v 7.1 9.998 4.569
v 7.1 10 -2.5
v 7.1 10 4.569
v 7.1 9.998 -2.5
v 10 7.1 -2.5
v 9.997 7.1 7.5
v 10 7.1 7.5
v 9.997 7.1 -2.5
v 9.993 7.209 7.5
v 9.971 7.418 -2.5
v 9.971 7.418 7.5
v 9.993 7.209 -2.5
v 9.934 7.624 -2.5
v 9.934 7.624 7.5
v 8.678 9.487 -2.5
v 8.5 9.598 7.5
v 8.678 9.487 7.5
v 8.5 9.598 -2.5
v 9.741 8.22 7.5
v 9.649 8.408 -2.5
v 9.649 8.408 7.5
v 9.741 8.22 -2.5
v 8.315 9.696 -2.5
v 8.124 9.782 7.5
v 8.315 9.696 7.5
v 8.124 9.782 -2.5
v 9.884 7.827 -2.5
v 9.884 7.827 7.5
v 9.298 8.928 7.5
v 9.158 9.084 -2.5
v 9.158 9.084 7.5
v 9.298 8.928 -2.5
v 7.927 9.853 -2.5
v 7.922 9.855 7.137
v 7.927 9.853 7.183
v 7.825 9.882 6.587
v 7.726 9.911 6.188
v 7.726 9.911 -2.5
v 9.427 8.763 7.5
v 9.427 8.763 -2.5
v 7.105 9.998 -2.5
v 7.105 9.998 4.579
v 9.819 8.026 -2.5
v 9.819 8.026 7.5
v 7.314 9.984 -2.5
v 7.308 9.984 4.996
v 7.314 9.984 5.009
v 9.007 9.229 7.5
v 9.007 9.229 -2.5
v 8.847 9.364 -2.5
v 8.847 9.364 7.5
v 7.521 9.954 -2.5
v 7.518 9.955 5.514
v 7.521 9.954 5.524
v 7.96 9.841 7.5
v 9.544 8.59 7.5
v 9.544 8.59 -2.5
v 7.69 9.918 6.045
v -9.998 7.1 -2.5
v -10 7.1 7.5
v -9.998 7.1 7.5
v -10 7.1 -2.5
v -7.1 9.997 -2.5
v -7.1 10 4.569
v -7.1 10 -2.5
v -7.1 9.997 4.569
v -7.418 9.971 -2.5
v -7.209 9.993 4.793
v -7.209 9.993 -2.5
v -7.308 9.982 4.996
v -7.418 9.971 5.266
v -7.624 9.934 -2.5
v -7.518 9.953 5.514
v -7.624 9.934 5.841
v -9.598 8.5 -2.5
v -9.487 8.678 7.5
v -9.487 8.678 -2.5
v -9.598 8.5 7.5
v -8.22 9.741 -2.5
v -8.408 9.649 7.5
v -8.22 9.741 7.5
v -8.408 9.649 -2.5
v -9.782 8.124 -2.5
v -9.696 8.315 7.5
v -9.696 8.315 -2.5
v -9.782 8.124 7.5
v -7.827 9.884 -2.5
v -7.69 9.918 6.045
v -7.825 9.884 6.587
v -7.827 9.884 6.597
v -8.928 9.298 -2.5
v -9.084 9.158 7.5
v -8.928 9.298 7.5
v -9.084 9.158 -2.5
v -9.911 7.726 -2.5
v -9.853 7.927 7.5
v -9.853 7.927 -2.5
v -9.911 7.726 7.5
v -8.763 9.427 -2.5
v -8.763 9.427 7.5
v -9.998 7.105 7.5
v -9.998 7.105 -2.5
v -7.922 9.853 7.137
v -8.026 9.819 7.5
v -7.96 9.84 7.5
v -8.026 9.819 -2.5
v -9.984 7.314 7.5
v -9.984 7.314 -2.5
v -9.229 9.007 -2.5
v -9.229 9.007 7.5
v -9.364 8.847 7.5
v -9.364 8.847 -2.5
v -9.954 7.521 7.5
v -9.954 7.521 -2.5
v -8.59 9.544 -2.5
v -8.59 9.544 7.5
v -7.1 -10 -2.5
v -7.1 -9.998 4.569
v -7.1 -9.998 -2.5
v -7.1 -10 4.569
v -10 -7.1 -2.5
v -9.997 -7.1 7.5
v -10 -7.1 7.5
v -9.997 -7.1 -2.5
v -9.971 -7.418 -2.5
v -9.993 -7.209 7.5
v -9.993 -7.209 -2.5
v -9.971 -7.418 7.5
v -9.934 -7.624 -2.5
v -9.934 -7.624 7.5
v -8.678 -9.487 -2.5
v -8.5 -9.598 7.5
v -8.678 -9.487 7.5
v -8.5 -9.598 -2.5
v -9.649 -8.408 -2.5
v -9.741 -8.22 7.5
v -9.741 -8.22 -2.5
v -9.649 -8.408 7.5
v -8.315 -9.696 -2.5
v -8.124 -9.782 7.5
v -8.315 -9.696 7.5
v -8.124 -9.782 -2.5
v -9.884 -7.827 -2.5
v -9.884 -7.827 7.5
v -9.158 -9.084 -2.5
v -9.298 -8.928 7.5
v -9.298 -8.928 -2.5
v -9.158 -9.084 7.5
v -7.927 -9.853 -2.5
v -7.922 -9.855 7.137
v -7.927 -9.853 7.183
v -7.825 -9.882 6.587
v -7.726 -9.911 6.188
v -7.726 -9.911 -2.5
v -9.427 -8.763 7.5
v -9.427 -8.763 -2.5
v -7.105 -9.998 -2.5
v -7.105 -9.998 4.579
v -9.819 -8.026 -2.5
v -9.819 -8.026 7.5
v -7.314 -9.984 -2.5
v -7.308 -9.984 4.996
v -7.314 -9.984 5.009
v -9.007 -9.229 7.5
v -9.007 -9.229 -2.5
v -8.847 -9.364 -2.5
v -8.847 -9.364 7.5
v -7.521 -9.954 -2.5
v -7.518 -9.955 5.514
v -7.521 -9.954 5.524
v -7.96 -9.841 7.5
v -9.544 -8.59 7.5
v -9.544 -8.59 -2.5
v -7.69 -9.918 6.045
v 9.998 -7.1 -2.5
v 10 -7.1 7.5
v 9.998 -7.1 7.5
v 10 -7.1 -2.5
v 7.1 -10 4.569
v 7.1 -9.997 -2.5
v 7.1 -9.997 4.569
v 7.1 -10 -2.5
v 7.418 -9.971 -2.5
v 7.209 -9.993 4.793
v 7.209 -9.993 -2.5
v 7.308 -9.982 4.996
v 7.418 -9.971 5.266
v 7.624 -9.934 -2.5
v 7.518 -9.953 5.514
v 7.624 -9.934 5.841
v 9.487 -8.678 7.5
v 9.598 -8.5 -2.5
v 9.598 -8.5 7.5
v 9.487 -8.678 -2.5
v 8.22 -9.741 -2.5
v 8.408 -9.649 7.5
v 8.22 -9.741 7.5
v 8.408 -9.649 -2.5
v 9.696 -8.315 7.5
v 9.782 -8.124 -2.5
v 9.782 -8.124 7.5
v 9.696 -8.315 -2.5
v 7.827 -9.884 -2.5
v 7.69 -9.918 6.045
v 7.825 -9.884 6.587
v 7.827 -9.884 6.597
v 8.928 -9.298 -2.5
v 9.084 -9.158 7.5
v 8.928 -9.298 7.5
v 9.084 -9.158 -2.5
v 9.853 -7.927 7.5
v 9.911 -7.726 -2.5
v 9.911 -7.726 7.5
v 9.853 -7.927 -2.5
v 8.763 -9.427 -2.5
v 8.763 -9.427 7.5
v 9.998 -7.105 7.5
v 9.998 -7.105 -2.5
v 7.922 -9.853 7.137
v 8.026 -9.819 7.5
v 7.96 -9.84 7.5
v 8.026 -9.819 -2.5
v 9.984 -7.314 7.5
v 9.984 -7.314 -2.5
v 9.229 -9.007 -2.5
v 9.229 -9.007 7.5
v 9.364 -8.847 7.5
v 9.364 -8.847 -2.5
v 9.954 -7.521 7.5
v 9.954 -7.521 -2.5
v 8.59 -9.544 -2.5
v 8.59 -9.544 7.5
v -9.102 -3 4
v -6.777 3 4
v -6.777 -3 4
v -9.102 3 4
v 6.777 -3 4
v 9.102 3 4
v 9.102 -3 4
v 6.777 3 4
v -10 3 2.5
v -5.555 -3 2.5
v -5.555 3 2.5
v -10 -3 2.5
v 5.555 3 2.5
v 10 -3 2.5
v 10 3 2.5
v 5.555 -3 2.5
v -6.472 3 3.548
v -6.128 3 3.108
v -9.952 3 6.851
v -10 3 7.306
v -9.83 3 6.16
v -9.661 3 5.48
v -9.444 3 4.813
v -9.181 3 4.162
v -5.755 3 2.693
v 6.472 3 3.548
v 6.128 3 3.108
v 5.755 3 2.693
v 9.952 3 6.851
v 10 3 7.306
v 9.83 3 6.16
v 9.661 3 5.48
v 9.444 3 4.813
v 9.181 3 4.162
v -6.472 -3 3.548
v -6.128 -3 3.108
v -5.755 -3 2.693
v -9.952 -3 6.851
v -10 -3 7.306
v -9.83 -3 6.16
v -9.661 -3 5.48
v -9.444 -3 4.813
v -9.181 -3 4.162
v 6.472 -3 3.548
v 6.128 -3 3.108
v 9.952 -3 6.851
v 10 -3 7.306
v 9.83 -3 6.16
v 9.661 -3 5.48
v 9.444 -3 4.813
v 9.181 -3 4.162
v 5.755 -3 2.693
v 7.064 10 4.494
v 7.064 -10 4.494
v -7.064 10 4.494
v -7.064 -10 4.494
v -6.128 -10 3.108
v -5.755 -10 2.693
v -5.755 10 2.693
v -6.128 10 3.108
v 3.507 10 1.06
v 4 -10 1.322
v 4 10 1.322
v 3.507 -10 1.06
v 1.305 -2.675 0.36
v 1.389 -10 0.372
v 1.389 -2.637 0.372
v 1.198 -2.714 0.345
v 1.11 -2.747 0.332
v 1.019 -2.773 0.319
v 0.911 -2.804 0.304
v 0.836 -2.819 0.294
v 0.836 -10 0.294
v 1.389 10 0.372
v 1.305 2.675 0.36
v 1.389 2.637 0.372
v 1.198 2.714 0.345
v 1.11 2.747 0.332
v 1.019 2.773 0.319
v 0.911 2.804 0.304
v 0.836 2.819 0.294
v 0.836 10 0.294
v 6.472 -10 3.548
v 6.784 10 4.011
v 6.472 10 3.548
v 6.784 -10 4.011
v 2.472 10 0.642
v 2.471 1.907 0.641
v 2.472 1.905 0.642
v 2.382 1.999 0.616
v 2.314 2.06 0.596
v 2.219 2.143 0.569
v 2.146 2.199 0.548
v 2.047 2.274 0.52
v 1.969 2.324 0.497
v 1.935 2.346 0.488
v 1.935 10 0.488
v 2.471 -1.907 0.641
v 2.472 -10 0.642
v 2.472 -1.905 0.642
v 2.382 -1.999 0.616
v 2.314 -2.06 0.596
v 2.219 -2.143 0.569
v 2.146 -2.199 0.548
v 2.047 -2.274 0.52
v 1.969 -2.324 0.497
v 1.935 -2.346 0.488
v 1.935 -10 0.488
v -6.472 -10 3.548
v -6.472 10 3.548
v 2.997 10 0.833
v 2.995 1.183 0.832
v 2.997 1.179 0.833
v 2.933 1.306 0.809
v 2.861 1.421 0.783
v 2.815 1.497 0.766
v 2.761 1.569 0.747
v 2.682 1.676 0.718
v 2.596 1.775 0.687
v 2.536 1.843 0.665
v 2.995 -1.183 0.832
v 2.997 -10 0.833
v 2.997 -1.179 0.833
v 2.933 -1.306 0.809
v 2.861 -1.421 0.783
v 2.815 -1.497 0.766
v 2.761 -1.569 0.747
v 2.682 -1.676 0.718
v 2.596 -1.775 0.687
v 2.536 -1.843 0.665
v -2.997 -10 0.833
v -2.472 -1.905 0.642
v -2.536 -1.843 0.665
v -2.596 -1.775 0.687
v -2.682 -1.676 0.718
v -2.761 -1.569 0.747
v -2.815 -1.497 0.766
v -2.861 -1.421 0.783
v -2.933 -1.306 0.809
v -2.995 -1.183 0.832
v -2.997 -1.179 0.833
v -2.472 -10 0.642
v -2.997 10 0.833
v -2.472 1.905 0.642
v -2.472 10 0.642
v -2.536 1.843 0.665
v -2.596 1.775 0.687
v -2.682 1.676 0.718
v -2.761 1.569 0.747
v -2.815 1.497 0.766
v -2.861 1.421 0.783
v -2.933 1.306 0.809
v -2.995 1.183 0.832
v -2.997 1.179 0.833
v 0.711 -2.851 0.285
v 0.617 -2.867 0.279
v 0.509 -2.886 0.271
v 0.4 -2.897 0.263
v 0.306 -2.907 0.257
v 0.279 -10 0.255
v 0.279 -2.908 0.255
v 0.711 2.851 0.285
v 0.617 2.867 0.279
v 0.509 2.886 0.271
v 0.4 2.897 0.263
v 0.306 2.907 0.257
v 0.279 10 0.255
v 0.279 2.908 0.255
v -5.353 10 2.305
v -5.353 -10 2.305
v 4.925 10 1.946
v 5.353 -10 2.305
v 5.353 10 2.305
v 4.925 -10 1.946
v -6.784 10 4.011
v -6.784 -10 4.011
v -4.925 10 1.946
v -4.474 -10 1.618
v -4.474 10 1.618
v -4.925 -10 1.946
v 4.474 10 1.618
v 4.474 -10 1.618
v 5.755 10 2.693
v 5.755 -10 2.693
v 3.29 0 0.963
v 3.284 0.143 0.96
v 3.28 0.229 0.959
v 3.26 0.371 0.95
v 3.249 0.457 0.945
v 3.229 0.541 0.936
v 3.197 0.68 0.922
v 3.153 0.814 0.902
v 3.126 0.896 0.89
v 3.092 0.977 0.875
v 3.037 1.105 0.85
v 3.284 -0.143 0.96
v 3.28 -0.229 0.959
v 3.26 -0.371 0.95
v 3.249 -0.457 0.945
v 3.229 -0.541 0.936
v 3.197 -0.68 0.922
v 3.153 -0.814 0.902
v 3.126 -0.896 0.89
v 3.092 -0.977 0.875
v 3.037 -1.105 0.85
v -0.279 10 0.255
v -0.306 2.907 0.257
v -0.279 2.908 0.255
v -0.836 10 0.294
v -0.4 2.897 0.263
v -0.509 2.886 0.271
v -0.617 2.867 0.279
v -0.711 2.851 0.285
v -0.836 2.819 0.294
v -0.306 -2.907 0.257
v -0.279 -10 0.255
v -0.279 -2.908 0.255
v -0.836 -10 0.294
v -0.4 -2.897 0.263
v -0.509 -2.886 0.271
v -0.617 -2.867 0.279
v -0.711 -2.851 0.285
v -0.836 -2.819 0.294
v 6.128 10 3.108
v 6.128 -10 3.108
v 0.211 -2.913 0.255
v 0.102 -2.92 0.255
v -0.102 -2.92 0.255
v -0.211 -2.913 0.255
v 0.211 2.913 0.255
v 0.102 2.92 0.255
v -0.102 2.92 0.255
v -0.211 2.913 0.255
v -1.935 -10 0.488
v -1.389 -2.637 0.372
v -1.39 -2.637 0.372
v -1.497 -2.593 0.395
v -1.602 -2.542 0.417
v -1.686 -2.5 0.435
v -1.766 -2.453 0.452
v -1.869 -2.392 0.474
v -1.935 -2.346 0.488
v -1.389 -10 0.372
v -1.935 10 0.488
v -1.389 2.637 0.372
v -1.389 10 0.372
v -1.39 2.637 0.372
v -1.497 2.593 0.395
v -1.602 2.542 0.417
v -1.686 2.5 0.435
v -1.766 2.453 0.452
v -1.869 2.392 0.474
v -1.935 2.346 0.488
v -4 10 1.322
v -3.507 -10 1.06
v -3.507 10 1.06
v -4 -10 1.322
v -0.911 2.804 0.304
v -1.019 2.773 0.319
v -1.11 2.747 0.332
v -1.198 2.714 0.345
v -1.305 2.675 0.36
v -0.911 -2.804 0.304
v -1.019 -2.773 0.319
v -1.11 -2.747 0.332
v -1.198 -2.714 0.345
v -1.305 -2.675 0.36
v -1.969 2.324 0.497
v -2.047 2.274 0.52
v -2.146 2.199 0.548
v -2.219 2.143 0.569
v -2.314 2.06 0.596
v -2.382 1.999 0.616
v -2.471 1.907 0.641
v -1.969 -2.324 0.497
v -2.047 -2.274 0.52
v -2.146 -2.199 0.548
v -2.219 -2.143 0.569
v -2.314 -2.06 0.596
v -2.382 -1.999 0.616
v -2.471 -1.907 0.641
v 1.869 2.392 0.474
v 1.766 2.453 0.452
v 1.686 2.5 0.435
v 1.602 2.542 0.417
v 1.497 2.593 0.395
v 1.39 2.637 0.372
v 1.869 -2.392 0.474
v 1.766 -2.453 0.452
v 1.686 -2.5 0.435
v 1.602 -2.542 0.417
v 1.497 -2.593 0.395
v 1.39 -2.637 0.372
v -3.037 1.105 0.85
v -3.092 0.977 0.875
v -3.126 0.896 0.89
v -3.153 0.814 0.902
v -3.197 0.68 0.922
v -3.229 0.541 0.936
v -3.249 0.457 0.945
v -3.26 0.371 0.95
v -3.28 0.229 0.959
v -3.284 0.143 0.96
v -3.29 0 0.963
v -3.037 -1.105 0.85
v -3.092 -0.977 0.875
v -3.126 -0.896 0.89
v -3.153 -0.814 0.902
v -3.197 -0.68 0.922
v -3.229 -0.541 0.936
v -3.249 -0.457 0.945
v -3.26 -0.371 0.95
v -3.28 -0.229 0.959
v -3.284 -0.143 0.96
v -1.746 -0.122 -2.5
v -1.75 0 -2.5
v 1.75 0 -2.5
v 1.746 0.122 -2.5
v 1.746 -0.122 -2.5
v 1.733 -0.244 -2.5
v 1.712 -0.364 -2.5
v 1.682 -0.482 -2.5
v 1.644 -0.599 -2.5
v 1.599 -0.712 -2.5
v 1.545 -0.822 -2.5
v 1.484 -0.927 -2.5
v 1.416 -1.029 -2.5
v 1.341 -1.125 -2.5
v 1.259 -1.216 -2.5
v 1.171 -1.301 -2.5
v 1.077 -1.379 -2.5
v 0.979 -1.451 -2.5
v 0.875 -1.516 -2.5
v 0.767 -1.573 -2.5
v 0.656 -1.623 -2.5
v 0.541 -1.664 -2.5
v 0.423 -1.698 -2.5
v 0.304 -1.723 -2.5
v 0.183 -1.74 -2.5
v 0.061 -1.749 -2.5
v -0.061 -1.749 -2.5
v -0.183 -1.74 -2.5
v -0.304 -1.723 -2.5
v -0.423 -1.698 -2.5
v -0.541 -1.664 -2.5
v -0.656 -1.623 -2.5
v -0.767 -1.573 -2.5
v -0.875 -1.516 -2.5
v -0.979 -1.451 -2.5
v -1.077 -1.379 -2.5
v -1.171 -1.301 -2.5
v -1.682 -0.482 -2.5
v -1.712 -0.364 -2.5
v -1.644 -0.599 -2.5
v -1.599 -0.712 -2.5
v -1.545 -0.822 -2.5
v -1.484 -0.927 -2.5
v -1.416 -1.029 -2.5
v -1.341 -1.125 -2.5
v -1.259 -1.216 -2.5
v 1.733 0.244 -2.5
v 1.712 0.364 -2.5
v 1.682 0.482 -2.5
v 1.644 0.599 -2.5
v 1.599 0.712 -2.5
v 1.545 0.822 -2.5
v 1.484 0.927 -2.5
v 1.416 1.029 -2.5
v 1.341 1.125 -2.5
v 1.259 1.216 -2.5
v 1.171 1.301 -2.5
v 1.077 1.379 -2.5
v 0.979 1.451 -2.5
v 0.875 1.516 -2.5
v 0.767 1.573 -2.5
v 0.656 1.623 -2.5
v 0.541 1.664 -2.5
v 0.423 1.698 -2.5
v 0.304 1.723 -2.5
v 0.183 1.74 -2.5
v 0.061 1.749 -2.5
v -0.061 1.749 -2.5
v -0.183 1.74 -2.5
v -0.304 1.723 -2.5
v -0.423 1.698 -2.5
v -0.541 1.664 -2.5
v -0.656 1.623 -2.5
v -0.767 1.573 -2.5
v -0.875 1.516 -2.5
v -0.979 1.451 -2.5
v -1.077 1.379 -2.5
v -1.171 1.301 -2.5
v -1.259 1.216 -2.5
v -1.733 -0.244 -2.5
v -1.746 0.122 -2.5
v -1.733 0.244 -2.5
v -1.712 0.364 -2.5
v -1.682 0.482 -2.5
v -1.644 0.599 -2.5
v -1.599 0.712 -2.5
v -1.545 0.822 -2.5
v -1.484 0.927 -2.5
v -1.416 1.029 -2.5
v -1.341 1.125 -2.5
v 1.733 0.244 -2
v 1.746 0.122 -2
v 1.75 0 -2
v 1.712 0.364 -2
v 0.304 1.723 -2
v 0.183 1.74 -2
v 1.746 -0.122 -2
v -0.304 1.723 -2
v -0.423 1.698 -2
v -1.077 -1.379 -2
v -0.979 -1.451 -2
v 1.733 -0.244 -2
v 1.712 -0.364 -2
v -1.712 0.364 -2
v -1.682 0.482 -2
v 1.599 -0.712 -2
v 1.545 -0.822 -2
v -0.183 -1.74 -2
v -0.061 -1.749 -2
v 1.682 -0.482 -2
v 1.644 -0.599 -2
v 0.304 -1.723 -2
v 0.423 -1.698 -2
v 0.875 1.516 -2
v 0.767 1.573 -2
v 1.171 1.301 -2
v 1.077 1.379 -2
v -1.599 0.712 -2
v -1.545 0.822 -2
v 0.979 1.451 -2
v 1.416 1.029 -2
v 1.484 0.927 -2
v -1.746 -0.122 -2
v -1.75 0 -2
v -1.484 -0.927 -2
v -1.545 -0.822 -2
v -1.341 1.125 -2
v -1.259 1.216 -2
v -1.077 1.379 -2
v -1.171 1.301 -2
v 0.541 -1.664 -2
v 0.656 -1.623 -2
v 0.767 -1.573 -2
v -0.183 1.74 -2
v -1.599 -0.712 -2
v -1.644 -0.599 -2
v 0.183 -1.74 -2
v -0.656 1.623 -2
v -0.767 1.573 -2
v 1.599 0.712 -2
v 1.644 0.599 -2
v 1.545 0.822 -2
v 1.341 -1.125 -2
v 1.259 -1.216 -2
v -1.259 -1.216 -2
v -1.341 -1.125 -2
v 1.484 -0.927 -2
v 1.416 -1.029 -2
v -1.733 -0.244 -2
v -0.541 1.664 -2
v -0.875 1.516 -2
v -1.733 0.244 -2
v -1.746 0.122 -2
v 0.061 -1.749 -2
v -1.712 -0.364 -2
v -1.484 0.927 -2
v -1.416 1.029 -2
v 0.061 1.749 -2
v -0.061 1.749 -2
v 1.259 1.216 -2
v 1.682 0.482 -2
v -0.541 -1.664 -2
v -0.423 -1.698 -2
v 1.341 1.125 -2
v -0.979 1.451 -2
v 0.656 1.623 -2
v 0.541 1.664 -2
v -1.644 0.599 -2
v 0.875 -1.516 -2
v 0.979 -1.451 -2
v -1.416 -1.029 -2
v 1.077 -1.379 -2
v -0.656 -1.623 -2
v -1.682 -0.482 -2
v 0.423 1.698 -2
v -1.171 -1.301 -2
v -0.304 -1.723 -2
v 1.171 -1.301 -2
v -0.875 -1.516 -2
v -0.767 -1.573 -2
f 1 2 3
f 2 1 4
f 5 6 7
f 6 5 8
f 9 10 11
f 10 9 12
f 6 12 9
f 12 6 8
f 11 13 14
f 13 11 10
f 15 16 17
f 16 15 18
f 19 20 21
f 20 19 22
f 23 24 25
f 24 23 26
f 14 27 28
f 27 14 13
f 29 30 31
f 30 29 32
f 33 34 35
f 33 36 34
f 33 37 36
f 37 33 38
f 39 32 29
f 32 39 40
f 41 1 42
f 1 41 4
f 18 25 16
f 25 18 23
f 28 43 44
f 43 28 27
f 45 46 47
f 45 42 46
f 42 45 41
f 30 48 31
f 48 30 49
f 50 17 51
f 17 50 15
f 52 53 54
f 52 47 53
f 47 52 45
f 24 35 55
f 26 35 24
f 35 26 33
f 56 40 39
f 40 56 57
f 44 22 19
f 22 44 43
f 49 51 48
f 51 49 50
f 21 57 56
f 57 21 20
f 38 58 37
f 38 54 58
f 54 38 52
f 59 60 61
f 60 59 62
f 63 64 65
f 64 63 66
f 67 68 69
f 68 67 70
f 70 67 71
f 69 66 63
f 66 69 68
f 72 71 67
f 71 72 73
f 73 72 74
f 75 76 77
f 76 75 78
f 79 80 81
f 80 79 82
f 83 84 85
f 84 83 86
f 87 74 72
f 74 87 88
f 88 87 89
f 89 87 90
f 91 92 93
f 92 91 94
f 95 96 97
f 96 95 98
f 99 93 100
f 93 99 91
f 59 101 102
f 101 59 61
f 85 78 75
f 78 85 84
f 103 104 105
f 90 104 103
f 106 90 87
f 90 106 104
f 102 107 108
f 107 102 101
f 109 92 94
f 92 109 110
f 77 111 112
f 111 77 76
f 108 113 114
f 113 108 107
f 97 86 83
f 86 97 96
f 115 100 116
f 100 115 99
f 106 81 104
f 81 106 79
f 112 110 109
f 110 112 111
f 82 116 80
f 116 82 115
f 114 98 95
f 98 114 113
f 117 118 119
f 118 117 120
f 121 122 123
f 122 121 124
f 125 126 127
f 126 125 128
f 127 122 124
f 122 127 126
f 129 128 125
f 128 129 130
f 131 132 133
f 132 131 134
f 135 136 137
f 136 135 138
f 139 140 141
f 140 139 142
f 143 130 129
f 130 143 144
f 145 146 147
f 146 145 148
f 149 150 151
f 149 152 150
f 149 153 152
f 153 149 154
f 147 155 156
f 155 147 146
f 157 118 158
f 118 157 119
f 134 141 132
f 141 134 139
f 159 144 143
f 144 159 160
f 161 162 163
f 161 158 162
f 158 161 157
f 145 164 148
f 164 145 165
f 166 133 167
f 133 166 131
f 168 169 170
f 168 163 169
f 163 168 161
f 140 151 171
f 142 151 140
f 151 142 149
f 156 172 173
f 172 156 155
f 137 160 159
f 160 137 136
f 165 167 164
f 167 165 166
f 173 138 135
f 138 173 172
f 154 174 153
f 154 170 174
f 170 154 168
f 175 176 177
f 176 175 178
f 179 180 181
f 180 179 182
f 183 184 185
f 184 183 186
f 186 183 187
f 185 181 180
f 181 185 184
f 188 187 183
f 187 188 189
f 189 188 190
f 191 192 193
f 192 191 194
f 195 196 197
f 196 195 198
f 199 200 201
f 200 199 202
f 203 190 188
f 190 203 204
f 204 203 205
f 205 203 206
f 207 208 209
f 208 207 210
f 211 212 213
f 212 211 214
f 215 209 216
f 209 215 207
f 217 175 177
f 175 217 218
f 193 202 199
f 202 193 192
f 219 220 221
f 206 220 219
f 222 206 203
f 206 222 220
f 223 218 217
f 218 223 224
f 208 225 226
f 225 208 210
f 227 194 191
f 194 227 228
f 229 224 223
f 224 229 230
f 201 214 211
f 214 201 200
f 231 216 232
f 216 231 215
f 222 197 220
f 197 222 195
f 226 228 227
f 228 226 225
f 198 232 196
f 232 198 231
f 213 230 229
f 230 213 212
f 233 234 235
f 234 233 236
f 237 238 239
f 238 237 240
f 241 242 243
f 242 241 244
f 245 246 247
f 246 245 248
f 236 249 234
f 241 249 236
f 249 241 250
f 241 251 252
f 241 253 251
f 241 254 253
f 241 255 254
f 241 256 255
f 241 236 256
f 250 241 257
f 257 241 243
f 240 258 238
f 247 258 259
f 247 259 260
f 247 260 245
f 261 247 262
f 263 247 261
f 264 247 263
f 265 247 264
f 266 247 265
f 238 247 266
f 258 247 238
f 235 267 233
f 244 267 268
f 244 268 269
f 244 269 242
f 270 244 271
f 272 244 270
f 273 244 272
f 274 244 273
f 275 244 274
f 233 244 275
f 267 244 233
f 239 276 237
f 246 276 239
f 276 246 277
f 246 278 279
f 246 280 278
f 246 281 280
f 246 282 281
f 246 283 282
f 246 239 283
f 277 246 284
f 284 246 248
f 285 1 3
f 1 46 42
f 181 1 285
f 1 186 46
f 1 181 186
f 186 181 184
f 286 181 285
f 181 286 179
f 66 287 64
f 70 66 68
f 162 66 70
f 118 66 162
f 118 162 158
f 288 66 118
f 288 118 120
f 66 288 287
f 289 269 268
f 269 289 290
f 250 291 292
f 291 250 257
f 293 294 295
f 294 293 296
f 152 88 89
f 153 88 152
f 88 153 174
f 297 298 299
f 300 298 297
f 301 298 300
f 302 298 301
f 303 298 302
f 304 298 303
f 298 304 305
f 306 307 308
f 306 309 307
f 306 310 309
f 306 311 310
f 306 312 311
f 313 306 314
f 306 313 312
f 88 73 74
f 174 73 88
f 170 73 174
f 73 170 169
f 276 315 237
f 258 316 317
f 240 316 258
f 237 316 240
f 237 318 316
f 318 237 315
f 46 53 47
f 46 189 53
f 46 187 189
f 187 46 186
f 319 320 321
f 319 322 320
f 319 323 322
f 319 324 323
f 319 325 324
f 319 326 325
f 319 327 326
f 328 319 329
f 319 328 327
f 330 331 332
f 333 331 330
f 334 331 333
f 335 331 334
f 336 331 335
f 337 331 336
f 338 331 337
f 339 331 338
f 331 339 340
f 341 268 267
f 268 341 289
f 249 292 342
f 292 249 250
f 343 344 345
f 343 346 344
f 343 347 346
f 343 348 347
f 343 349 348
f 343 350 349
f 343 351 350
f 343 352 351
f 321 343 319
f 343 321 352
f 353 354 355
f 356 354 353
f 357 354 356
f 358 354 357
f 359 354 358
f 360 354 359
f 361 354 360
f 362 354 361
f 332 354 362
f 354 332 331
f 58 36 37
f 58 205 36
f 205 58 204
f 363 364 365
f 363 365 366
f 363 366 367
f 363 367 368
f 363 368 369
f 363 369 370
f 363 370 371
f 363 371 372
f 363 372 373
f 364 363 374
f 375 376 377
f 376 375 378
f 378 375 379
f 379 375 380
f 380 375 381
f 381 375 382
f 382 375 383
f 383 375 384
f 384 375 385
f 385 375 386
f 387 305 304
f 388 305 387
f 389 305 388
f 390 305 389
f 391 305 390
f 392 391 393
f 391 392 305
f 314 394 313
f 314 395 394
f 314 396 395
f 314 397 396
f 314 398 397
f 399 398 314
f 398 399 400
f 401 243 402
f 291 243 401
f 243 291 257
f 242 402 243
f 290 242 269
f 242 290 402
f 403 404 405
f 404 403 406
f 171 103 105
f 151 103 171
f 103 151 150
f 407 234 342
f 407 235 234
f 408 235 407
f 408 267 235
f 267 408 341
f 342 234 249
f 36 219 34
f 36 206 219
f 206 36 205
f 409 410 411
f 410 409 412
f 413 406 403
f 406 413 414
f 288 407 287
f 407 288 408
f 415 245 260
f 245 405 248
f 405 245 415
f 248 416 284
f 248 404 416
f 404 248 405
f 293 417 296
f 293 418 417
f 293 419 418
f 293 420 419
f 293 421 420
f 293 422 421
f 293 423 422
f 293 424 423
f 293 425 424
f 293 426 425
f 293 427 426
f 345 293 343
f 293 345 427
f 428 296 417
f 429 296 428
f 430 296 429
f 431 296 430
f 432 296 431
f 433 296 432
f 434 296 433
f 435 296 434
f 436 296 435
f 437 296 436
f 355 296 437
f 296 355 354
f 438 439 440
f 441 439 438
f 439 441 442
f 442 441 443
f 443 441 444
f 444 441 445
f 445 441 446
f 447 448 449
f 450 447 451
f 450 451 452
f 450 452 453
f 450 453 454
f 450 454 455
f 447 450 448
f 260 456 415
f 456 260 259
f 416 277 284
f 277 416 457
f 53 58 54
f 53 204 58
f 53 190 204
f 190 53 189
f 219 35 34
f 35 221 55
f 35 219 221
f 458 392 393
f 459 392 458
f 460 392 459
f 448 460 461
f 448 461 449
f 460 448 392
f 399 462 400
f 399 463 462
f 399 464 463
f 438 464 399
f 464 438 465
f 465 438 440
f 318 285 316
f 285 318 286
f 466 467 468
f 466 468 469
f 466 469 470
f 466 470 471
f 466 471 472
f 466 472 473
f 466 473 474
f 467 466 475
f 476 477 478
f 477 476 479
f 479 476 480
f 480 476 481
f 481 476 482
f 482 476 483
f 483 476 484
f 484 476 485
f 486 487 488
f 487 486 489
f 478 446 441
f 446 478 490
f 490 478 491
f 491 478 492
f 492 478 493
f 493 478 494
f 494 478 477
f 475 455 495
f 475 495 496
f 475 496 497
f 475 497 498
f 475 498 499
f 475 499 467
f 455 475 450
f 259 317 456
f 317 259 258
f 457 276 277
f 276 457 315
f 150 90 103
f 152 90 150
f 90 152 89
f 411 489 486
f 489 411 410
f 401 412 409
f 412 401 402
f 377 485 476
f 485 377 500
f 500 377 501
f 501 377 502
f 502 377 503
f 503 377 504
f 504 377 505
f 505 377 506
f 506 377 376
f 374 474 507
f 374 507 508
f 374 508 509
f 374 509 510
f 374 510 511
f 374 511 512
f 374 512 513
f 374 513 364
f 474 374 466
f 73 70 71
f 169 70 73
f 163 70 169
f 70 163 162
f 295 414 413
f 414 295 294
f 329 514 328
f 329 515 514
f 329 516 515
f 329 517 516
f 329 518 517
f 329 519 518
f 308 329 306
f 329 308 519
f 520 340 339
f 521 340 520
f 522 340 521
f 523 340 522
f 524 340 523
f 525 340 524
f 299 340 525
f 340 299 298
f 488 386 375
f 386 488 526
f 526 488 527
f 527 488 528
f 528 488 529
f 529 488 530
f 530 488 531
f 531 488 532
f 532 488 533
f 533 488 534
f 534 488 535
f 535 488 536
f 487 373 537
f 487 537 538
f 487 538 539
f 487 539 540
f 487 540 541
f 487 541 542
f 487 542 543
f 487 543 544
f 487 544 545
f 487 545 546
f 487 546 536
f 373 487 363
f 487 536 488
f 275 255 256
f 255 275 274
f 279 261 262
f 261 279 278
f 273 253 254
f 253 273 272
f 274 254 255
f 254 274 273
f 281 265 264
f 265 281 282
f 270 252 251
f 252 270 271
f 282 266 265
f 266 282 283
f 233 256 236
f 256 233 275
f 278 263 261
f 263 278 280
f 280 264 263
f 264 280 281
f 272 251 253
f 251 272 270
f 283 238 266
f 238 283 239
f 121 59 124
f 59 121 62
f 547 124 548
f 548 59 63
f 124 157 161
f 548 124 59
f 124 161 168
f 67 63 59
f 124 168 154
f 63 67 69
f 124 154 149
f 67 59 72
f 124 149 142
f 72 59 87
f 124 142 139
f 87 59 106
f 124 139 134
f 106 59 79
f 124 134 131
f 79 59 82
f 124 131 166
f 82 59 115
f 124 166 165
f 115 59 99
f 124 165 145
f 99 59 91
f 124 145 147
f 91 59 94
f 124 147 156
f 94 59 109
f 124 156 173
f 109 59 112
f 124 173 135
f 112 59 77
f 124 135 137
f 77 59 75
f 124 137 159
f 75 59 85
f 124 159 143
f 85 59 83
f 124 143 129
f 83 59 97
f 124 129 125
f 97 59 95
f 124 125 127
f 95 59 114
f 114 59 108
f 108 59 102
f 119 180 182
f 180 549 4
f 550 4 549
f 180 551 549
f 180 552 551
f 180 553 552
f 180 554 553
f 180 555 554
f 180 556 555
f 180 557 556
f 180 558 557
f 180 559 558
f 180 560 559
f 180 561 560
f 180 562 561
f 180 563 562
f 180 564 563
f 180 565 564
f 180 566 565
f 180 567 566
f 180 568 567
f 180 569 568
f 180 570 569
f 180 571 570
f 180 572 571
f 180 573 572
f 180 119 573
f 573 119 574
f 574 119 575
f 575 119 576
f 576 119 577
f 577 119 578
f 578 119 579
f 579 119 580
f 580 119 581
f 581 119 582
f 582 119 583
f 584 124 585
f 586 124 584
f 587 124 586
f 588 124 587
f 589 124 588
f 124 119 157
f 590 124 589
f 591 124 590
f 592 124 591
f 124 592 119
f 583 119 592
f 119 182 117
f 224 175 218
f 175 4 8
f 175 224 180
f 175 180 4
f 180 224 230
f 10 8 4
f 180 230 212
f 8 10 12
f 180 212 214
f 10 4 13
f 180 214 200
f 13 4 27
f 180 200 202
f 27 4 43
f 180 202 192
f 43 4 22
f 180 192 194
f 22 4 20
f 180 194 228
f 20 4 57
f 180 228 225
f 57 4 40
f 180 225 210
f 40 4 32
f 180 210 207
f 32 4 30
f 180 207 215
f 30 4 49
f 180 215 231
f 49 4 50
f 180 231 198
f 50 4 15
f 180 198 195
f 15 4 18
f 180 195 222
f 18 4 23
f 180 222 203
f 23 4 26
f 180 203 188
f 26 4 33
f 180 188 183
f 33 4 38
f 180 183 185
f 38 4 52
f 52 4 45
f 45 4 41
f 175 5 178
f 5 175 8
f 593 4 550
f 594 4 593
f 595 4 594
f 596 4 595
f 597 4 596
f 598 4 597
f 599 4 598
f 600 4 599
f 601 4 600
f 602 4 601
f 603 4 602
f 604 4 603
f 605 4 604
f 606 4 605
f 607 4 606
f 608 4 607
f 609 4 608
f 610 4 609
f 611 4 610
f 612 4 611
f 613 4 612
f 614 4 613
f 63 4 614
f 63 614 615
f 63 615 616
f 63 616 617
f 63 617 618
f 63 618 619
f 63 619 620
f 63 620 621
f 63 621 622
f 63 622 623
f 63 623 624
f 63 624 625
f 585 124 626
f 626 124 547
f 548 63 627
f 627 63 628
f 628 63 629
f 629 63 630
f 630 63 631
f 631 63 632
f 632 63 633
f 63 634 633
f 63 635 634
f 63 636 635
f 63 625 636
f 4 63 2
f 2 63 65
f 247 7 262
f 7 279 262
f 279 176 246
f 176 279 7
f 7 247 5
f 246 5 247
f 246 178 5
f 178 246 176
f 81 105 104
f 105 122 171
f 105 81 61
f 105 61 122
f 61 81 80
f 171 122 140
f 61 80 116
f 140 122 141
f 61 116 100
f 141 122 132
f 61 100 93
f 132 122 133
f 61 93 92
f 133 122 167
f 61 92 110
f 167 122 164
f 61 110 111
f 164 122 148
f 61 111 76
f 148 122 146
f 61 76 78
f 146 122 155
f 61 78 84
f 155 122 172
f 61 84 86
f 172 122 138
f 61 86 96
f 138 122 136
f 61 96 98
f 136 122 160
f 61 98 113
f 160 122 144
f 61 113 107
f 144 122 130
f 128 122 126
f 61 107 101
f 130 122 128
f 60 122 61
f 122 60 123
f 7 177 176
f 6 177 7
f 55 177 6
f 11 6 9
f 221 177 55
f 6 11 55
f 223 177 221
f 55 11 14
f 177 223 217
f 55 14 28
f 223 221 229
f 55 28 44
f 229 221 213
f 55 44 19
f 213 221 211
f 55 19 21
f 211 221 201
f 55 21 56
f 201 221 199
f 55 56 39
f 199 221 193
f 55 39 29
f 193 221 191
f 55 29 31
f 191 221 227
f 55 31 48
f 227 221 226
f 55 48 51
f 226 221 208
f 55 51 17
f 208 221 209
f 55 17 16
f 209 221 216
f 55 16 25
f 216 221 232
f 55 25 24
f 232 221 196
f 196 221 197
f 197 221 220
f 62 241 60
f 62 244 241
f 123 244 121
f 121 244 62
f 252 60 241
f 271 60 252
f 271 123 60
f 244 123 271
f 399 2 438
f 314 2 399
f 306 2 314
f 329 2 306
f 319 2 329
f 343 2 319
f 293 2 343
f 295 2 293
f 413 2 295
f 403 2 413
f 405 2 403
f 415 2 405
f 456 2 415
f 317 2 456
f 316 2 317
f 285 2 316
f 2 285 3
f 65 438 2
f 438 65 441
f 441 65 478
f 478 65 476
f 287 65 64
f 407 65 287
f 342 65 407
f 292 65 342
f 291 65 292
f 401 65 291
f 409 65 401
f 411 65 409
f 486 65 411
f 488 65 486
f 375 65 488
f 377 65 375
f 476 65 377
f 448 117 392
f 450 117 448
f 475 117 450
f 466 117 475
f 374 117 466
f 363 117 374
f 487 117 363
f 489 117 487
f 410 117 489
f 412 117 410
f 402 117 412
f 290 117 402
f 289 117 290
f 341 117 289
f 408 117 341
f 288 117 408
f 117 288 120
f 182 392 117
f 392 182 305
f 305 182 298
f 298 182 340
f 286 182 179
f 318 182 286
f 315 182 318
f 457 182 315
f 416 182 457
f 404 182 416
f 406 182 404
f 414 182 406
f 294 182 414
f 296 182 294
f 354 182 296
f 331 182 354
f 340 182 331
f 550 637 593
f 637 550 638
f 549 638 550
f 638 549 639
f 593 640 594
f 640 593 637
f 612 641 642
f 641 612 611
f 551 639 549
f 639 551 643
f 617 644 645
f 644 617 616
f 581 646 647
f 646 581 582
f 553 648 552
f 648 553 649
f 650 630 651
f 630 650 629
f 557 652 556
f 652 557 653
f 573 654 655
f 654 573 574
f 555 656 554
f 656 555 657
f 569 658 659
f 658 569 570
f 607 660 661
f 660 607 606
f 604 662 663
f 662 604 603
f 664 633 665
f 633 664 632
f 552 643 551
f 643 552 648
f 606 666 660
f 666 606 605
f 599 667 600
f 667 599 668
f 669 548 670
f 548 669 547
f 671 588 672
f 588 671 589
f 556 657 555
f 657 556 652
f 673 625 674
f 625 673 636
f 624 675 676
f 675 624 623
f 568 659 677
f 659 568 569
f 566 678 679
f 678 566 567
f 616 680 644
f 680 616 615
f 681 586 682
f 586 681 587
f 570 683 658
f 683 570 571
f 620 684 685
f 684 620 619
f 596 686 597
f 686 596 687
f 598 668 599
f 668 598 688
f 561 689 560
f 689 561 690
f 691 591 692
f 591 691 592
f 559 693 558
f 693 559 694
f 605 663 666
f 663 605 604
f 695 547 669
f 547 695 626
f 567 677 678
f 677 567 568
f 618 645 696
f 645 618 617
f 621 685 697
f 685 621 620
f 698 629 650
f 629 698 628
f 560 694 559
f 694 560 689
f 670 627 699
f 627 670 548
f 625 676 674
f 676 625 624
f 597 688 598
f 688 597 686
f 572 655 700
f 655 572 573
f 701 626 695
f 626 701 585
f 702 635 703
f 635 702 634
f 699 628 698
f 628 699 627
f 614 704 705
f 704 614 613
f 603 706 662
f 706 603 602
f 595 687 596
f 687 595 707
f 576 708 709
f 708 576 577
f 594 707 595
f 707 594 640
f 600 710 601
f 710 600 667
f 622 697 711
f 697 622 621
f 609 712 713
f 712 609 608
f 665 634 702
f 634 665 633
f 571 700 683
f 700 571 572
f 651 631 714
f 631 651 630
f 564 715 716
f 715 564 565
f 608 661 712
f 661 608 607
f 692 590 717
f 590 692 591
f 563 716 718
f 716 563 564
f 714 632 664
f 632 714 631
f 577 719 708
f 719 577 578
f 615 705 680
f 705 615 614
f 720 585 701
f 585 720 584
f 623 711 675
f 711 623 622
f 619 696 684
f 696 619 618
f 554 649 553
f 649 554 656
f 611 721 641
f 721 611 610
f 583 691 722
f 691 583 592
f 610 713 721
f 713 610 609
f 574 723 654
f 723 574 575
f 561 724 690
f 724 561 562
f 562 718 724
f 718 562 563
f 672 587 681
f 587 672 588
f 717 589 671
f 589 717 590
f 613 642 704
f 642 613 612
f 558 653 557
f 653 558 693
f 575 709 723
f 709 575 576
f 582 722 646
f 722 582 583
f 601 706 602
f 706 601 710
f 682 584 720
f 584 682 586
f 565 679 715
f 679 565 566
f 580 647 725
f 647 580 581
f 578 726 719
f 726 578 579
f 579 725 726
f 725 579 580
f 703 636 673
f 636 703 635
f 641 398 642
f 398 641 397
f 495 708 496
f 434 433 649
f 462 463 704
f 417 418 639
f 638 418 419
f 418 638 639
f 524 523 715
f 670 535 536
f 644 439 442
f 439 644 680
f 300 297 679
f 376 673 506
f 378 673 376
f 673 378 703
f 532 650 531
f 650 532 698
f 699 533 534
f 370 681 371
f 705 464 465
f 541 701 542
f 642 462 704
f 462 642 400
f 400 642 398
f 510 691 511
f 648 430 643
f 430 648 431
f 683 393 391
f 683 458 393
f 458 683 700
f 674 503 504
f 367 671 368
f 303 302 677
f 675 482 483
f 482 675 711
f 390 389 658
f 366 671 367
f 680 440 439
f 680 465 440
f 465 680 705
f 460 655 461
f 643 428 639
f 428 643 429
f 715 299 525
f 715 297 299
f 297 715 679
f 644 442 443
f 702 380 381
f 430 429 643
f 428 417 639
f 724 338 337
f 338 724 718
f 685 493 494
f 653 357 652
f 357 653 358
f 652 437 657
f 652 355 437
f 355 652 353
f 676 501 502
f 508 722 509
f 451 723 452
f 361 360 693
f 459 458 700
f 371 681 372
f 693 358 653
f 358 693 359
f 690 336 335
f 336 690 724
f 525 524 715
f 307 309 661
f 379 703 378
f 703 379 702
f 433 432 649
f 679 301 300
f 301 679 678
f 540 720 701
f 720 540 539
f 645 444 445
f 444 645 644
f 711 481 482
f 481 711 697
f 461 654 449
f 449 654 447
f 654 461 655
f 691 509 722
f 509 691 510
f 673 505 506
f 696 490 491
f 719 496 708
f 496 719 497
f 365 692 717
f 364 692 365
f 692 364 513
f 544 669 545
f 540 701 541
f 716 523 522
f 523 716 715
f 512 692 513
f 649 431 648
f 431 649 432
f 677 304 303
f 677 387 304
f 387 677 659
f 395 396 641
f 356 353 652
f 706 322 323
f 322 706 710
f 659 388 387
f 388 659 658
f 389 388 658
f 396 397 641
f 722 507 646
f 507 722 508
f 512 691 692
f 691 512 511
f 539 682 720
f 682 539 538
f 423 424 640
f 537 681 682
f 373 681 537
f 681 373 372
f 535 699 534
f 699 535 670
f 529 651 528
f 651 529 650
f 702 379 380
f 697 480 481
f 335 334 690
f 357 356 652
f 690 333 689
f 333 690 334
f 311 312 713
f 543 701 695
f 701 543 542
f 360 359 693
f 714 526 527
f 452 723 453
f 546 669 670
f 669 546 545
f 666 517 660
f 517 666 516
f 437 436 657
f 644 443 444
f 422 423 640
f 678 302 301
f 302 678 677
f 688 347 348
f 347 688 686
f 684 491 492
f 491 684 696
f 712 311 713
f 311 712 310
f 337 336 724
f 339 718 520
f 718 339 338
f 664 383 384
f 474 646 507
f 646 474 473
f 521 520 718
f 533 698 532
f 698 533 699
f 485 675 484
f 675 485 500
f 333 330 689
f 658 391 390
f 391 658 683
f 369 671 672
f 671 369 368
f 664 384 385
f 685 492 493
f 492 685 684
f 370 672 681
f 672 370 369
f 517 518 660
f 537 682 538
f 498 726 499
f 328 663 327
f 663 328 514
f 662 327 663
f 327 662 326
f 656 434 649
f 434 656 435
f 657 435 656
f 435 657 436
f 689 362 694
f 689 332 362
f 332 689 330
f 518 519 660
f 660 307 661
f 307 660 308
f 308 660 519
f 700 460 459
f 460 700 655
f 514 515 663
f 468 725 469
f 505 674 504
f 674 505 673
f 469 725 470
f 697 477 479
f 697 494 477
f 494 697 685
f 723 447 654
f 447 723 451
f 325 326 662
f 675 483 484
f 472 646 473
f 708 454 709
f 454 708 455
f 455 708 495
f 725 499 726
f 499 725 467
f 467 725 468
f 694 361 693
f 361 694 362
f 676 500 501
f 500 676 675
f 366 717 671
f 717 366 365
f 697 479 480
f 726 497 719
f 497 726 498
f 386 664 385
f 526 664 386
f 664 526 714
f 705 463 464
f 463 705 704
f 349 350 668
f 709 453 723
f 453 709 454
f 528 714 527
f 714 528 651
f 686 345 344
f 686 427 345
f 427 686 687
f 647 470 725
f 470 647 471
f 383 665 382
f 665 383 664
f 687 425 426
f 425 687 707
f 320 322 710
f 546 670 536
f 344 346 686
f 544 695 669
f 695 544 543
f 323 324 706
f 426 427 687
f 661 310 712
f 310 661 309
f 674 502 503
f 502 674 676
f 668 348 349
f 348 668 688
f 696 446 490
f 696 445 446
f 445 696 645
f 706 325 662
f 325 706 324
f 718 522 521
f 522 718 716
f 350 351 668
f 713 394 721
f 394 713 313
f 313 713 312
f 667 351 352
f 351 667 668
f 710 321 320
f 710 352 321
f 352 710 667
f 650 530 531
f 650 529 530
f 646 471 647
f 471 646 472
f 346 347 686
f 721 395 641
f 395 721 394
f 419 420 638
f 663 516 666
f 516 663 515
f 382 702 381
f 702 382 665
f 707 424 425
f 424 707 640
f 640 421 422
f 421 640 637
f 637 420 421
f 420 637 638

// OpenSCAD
// Curve Subdivision:
$fn=90;
// Cable Diameter:
diametro_cavo = 16;
// Base Lenght:
base_dim = 20;
// Base Height:
base_alt = 5;
// Fillet Radius:
raggio_smussatura = 3;
// Hole Diameter:
diametro_foro = 3.5;
// Tie Height:
altezza_fascetta = 1.5;
// Tie Width:
larghezza_fascetta = 6;


// This is just to make differences...
addendum = 0.1;

ferma_cavo();

module ferma_cavo() {
    difference() {
        // Base:
        translate([0,0,base_alt/2]) cube([base_dim, base_dim, base_alt*2], center = true);
        // Smussi:
        for (i=[0,90,180,270]) {
            rotate([0,0,i]) difference() {
                translate([base_dim/2-raggio_smussatura/2+addendum, base_dim/2-raggio_smussatura/2+addendum, 0]) cube([raggio_smussatura, raggio_smussatura, base_alt*4], center=true);
                translate([base_dim/2-raggio_smussatura, base_dim/2-raggio_smussatura, 0]) cylinder(h=base_alt*4, r=raggio_smussatura,center=true);
            }
        }
        // Svaso:
        cylinder(h=base_alt+addendum, d=diametro_foro, center=true);
        translate([0, 0, -2]) cylinder(h=2*base_alt+addendum, r1=diametro_foro/2, r2=2*diametro_foro);
        // Foro Cacciavite:
        translate([0,0,base_alt/2]) cylinder(h=base_alt, d=diametro_foro*2.0);
        // Passaggi Fascette:
        translate([0,0,base_alt/2+altezza_fascetta/2]) {
            cube([base_dim*2, larghezza_fascetta, altezza_fascetta], center=true);
            translate([0,0,base_alt]) rotate([90,0,0]) cylinder(d=diametro_cavo, h=base_dim*2, center=true);
        }
        // Smussature Fascette:
        difference() {
            translate([0,0,base_alt*1.5+altezza_fascetta/2]) rotate([90,0,0]) difference() {
                cylinder(d=base_dim+altezza_fascetta*2, h=larghezza_fascetta, center=true);
                cylinder(d=base_dim+addendum, h=larghezza_fascetta+addendum, center=true);
            }
            translate([0,0,0]) cube([base_dim*2, base_dim*2,base_alt], center=true);
        }
    }
}
